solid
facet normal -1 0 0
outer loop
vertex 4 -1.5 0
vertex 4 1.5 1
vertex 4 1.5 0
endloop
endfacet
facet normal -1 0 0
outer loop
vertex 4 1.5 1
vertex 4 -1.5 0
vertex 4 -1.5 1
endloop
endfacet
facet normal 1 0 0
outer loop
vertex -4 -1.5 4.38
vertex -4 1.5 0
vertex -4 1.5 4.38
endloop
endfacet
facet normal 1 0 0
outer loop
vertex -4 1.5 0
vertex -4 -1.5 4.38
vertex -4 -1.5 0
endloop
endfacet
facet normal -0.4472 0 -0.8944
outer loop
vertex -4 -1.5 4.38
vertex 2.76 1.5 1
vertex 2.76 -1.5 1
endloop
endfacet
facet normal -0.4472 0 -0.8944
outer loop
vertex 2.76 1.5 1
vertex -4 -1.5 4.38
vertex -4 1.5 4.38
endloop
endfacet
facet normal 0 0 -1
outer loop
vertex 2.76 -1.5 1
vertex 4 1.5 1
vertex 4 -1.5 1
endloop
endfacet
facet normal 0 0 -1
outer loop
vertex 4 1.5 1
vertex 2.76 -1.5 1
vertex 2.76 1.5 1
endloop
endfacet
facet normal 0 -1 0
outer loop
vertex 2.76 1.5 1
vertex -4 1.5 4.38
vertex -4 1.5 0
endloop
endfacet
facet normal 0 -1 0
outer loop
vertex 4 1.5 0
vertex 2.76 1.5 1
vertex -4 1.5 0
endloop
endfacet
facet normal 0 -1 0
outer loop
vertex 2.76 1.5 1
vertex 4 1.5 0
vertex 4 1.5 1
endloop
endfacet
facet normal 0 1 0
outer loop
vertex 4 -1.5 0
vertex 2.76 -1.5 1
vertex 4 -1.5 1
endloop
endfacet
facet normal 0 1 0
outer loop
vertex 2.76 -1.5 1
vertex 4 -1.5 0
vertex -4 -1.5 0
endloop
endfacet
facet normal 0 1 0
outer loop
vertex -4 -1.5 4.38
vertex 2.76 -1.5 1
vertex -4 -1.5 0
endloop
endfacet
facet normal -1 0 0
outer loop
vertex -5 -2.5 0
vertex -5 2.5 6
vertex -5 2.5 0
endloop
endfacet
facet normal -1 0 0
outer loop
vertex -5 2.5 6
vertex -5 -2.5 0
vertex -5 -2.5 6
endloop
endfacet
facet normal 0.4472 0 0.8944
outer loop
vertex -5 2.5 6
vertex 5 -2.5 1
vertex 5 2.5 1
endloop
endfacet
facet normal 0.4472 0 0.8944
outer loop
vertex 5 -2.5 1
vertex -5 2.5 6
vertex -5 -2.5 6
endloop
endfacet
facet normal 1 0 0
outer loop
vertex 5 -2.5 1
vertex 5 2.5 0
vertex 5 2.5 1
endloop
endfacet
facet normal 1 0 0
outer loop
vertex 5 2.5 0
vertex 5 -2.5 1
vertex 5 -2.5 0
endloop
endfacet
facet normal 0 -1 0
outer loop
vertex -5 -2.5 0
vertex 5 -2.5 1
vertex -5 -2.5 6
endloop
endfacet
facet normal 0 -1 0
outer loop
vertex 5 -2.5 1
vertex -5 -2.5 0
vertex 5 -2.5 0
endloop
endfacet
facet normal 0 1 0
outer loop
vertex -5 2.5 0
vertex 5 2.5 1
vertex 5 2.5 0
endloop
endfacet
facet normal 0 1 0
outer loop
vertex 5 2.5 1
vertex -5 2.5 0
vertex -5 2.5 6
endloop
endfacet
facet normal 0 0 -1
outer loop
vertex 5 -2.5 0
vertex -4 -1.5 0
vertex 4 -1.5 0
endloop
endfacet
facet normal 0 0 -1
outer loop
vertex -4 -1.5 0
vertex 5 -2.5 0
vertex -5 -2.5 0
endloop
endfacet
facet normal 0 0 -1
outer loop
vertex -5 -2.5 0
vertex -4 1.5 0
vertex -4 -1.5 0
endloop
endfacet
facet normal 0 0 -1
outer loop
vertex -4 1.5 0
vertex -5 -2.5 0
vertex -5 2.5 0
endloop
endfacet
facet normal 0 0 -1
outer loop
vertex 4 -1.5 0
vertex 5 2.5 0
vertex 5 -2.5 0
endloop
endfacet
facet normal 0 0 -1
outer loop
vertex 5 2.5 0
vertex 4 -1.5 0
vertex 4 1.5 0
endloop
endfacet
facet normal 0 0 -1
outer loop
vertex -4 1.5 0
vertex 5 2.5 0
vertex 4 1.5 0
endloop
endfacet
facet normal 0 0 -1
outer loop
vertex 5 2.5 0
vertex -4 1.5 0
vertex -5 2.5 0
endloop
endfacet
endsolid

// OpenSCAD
// file: ../p/rect2p.scad
use <../lib.scad>
function ldraw_lib__rect2p() = [
// 0 Rectangle with 2 Parallel Edges
// 0 Name: rect2p.dat
// 0 Author: Donald Sutter [technog]
// 0 !LDRAW_ORG Primitive UPDATE 2010-01
// 0 !LICENSE Licensed under CC BY 4.0 : see CAreadme.txt
// 
// 0 BFC CERTIFY CCW
  [0,"BFC","CERTIFY"],
  [0,"BFC","CCW"],
// 
// 0 !HISTORY 2003-08-01 [PTadmin] Official Update 2003-02
// 0 !HISTORY 2007-06-24 [PTadmin] Header formatted for Contributor Agreement
// 0 !HISTORY 2008-07-01 [PTadmin] Official Update 2008-01
// 0 !HISTORY 2010-01-17 [mikeheide] changed winding to CCW
// 0 !HISTORY 2010-04-05 [PTadmin] Official Update 2010-01
// 
// 
// 2 24 1 0 1 -1 0 1
  [2,24,1,0,1,-1,0,1],
// 2 24 -1 0 -1 1 0 -1
  [2,24,-1,0,-1,1,0,-1],
// 4 16 -1 0 1 -1 0 -1 1 0 -1 1 0 1
  [4,16,-1,0,1,-1,0,-1,1,0,-1,1,0,1],
// 0
];
module ldraw_lib__rect2p(step=0, col=false, unit=2/5, alt=false, line=0.2, solid=!$preview)
    makepoly(ldraw_lib__rect2p(), step=step, col=col, unit=unit, alt=alt, line=line, solid=solid);
ldraw_lib__rect2p(line=0.2);
// file: ../p/rect.scad
use <../lib.scad>
function ldraw_lib__rect() = [
// 0 Rectangle
// 0 Name: rect.dat
// 0 Author: James Jessiman
// 0 !LDRAW_ORG Primitive UPDATE 2010-01
// 0 !LICENSE Licensed under CC BY 4.0 : see CAreadme.txt
// 
// 0 BFC CERTIFY CCW
  [0,"BFC","CERTIFY"],
  [0,"BFC","CCW"],
// 
// 0 !HISTORY 2002-04-05 [hafhead] Added BFC statement
// 0 !HISTORY 2002-04-25 [PTadmin] Official Update 2002-02
// 0 !HISTORY 2007-06-24 [PTadmin] Header formatted for Contributor Agreement
// 0 !HISTORY 2008-07-01 [PTadmin] Official Update 2008-01
// 0 !HISTORY 2010-01-17 [mikeheide] changed winding to CCW
// 0 !HISTORY 2010-04-05 [PTadmin] Official Update 2010-01
// 
// 
// 2 24 1 0 1 -1 0 1
  [2,24,1,0,1,-1,0,1],
// 2 24 -1 0 1 -1 0 -1
  [2,24,-1,0,1,-1,0,-1],
// 2 24 -1 0 -1 1 0 -1
  [2,24,-1,0,-1,1,0,-1],
// 2 24 1 0 -1 1 0 1
  [2,24,1,0,-1,1,0,1],
// 4 16 -1 0 1 -1 0 -1 1 0 -1 1 0 1
  [4,16,-1,0,1,-1,0,-1,1,0,-1,1,0,1],
// 0
];
module ldraw_lib__rect(step=0, col=false, unit=2/5, alt=false, line=0.2, solid=!$preview)
    makepoly(ldraw_lib__rect(), step=step, col=col, unit=unit, alt=alt, line=line, solid=solid);
ldraw_lib__rect(line=0.2);
// file: ../p/box2-5.scad
use <../lib.scad>
function ldraw_lib__box2_5() = [
// 0 Box with 2 Faces without 5 Edges
// 0 Name: box2-5.dat
// 0 Author: Steffen [Steffen]
// 0 !LDRAW_ORG Primitive UPDATE 2003-03
// 0 !LICENSE Licensed under CC BY 4.0 : see CAreadme.txt
// 
// 0 BFC CERTIFY CCW
  [0,"BFC","CERTIFY"],
  [0,"BFC","CCW"],
// 
// 0 !HISTORY 2003-12-19 [PTadmin] Official Update 2003-03
// 0 !HISTORY 2007-06-24 [PTadmin] Header formatted for Contributor Agreement
// 0 !HISTORY 2008-07-01 [PTadmin] Official Update 2008-01
// 
// 
// 2 24 1 1 1 -1 1 1
  [2,24,1,1,1,-1,1,1],
// 2 24 1 1 -1 -1 1 -1
  [2,24,1,1,-1,-1,1,-1],
// 2 24 1 -1 1 -1 -1 1
  [2,24,1,-1,1,-1,-1,1],
// 2 24 -1 -1 1 -1 1 1
  [2,24,-1,-1,1,-1,1,1],
// 2 24 1 -1 1 1 1 1
  [2,24,1,-1,1,1,1,1],
// 2 24 -1 1 -1 -1 1 1
  [2,24,-1,1,-1,-1,1,1],
// 2 24 1 1 -1 1 1 1
  [2,24,1,1,-1,1,1,1],
// 4 16 1 1 1 1 1 -1 -1 1 -1 -1 1 1
  [4,16,1,1,1,1,1,-1,-1,1,-1,-1,1,1],
// 4 16 1 1 1 -1 1 1 -1 -1 1 1 -1 1
  [4,16,1,1,1,-1,1,1,-1,-1,1,1,-1,1],
// 0
];
module ldraw_lib__box2_5(step=0, col=false, unit=2/5, alt=false, line=0.2, solid=!$preview)
    makepoly(ldraw_lib__box2_5(), step=step, col=col, unit=unit, alt=alt, line=line, solid=solid);
ldraw_lib__box2_5(line=0.2);
// main file
use <../lib.scad>
use <../p/box2-5.scad>
use <../p/rect.scad>
use <../p/rect2p.scad>
function ldraw_lib__u7031() = [
// 0 Modulex Slope Brick 27  2 x  1
// 0 Name: u7031.dat
// 0 Author: Magnus Forsberg [MagFors]
// 0 !LDRAW_ORG Part UPDATE 2025-09
// 0 !LICENSE Licensed under CC BY 4.0 : see CAreadme.txt
// 
// 0 BFC CERTIFY CCW
  [0,"BFC","CERTIFY"],
  [0,"BFC","CCW"],
// 
// 0 !KEYWORDS 27.5651 degree, Bricklink Mx1521, Peeron x717, Rebrickable 1521
// 0 !KEYWORDS slope 1:2
// 
// 0 !HISTORY 2025-06-06 [MagFors] Original design by Tore Eriksson as slp0102c
// 0 !HISTORY 2025-09-29 [OrionP] Official Update 2025-09
// 
// 1 16 10 -1.25 0 0 1 0 -1.25 0 0 0 0 3.75 rect.dat
  [1,16,10,-1.25,0,0,1,0,-1.25,0,0,0,0,3.75, ldraw_lib__rect()],
// 1 16 -10 -5.475 0 0 -1 0 -5.475 0 0 0 0 -3.75 rect.dat
  [1,16,-10,-5.475,0,0,-1,0,-5.475,0,0,0,0,-3.75, ldraw_lib__rect()],
// 1 16 -1.55 -6.725 0 8.45 0 0 4.225 -1 0 0 0 -3.75 rect2p.dat
  [1,16,-1.55,-6.725,0,8.45,0,0,4.225,-1,0,0,0,-3.75, ldraw_lib__rect2p()],
// 1 16 8.45 -2.5 0 1.55 0 0 0 -1 0 0 0 -3.75 rect.dat
  [1,16,8.45,-2.5,0,1.55,0,0,0,-1,0,0,0,-3.75, ldraw_lib__rect()],
// 3 16 6.9 -2.5 3.75 -10 -10.95 3.75 -10 0 3.75
  [3,16,6.9,-2.5,3.75,-10,-10.95,3.75,-10,0,3.75],
// 4 16 10 -2.5 3.75 6.9 -2.5 3.75 -10 0 3.75 10 0 3.75
  [4,16,10,-2.5,3.75,6.9,-2.5,3.75,-10,0,3.75,10,0,3.75],
// 4 16 -10 0 -3.75 6.9 -2.5 -3.75 10 -2.5 -3.75 10 0 -3.75
  [4,16,-10,0,-3.75,6.9,-2.5,-3.75,10,-2.5,-3.75,10,0,-3.75],
// 3 16 -10 -10.95 -3.75 6.9 -2.5 -3.75 -10 0 -3.75
  [3,16,-10,-10.95,-3.75,6.9,-2.5,-3.75,-10,0,-3.75],
// 2 24 -10 0 -3.75 10 0 -3.75
  [2,24,-10,0,-3.75,10,0,-3.75],
// 2 24 -10 0 3.75 10 0 3.75
  [2,24,-10,0,3.75,10,0,3.75],
// 1 16 0 -1.25 0 0 -12.5 0 0 -6.25 -7.5 6.25 0 0 box2-5.dat
  [1,16,0,-1.25,0,0,-12.5,0,0,-6.25,-7.5,6.25,0,0, ldraw_lib__box2_5()],
// 1 16 12.5 -1.25 0 0 -1 0 -1.25 0 0 0 0 -6.25 rect.dat
  [1,16,12.5,-1.25,0,0,-1,0,-1.25,0,0,0,0,-6.25, ldraw_lib__rect()],
// 4 16 12.5 0 -6.25 12.5 -2.5 -6.25 -12.5 -15 -6.25 -12.5 0 -6.25
  [4,16,12.5,0,-6.25,12.5,-2.5,-6.25,-12.5,-15,-6.25,-12.5,0,-6.25],
// 4 16 -12.5 0 6.25 -12.5 -15. 6.25 12.5 -2.5 6.25 12.5 0 6.25
  [4,16,-12.5,0,6.25,-12.5,-15.,6.25,12.5,-2.5,6.25,12.5,0,6.25],
// 2 24 -12.5 0 -6.25 12.5 0 -6.25
  [2,24,-12.5,0,-6.25,12.5,0,-6.25],
// 2 24 -12.5 0 6.25 12.5 0 6.25
  [2,24,-12.5,0,6.25,12.5,0,6.25],
// 4 16 -10 0 -3.75 10 0 -3.75 12.5 0 -6.25 -12.5 0 -6.25
  [4,16,-10,0,-3.75,10,0,-3.75,12.5,0,-6.25,-12.5,0,-6.25],
// 4 16 -12.5 0 6.25 -10 0 3.75 -10 0 -3.75 -12.5 0 -6.25
  [4,16,-12.5,0,6.25,-10,0,3.75,-10,0,-3.75,-12.5,0,-6.25],
// 4 16 10 0 -3.75 10 0 3.75 12.5 0 6.25 12.5 0 -6.25
  [4,16,10,0,-3.75,10,0,3.75,12.5,0,6.25,12.5,0,-6.25],
// 4 16 10 0 3.75 -10 0 3.75 -12.5 0 6.25 12.5 0 6.25
  [4,16,10,0,3.75,-10,0,3.75,-12.5,0,6.25,12.5,0,6.25],
];
module ldraw_lib__u7031(step=0, col=false, unit=2/5, alt=false, line=0.2, solid=!$preview)
    makepoly(ldraw_lib__u7031(), step=step, col=col, unit=unit, alt=alt, line=line, solid=solid);
ldraw_lib__u7031(line=0.2);
